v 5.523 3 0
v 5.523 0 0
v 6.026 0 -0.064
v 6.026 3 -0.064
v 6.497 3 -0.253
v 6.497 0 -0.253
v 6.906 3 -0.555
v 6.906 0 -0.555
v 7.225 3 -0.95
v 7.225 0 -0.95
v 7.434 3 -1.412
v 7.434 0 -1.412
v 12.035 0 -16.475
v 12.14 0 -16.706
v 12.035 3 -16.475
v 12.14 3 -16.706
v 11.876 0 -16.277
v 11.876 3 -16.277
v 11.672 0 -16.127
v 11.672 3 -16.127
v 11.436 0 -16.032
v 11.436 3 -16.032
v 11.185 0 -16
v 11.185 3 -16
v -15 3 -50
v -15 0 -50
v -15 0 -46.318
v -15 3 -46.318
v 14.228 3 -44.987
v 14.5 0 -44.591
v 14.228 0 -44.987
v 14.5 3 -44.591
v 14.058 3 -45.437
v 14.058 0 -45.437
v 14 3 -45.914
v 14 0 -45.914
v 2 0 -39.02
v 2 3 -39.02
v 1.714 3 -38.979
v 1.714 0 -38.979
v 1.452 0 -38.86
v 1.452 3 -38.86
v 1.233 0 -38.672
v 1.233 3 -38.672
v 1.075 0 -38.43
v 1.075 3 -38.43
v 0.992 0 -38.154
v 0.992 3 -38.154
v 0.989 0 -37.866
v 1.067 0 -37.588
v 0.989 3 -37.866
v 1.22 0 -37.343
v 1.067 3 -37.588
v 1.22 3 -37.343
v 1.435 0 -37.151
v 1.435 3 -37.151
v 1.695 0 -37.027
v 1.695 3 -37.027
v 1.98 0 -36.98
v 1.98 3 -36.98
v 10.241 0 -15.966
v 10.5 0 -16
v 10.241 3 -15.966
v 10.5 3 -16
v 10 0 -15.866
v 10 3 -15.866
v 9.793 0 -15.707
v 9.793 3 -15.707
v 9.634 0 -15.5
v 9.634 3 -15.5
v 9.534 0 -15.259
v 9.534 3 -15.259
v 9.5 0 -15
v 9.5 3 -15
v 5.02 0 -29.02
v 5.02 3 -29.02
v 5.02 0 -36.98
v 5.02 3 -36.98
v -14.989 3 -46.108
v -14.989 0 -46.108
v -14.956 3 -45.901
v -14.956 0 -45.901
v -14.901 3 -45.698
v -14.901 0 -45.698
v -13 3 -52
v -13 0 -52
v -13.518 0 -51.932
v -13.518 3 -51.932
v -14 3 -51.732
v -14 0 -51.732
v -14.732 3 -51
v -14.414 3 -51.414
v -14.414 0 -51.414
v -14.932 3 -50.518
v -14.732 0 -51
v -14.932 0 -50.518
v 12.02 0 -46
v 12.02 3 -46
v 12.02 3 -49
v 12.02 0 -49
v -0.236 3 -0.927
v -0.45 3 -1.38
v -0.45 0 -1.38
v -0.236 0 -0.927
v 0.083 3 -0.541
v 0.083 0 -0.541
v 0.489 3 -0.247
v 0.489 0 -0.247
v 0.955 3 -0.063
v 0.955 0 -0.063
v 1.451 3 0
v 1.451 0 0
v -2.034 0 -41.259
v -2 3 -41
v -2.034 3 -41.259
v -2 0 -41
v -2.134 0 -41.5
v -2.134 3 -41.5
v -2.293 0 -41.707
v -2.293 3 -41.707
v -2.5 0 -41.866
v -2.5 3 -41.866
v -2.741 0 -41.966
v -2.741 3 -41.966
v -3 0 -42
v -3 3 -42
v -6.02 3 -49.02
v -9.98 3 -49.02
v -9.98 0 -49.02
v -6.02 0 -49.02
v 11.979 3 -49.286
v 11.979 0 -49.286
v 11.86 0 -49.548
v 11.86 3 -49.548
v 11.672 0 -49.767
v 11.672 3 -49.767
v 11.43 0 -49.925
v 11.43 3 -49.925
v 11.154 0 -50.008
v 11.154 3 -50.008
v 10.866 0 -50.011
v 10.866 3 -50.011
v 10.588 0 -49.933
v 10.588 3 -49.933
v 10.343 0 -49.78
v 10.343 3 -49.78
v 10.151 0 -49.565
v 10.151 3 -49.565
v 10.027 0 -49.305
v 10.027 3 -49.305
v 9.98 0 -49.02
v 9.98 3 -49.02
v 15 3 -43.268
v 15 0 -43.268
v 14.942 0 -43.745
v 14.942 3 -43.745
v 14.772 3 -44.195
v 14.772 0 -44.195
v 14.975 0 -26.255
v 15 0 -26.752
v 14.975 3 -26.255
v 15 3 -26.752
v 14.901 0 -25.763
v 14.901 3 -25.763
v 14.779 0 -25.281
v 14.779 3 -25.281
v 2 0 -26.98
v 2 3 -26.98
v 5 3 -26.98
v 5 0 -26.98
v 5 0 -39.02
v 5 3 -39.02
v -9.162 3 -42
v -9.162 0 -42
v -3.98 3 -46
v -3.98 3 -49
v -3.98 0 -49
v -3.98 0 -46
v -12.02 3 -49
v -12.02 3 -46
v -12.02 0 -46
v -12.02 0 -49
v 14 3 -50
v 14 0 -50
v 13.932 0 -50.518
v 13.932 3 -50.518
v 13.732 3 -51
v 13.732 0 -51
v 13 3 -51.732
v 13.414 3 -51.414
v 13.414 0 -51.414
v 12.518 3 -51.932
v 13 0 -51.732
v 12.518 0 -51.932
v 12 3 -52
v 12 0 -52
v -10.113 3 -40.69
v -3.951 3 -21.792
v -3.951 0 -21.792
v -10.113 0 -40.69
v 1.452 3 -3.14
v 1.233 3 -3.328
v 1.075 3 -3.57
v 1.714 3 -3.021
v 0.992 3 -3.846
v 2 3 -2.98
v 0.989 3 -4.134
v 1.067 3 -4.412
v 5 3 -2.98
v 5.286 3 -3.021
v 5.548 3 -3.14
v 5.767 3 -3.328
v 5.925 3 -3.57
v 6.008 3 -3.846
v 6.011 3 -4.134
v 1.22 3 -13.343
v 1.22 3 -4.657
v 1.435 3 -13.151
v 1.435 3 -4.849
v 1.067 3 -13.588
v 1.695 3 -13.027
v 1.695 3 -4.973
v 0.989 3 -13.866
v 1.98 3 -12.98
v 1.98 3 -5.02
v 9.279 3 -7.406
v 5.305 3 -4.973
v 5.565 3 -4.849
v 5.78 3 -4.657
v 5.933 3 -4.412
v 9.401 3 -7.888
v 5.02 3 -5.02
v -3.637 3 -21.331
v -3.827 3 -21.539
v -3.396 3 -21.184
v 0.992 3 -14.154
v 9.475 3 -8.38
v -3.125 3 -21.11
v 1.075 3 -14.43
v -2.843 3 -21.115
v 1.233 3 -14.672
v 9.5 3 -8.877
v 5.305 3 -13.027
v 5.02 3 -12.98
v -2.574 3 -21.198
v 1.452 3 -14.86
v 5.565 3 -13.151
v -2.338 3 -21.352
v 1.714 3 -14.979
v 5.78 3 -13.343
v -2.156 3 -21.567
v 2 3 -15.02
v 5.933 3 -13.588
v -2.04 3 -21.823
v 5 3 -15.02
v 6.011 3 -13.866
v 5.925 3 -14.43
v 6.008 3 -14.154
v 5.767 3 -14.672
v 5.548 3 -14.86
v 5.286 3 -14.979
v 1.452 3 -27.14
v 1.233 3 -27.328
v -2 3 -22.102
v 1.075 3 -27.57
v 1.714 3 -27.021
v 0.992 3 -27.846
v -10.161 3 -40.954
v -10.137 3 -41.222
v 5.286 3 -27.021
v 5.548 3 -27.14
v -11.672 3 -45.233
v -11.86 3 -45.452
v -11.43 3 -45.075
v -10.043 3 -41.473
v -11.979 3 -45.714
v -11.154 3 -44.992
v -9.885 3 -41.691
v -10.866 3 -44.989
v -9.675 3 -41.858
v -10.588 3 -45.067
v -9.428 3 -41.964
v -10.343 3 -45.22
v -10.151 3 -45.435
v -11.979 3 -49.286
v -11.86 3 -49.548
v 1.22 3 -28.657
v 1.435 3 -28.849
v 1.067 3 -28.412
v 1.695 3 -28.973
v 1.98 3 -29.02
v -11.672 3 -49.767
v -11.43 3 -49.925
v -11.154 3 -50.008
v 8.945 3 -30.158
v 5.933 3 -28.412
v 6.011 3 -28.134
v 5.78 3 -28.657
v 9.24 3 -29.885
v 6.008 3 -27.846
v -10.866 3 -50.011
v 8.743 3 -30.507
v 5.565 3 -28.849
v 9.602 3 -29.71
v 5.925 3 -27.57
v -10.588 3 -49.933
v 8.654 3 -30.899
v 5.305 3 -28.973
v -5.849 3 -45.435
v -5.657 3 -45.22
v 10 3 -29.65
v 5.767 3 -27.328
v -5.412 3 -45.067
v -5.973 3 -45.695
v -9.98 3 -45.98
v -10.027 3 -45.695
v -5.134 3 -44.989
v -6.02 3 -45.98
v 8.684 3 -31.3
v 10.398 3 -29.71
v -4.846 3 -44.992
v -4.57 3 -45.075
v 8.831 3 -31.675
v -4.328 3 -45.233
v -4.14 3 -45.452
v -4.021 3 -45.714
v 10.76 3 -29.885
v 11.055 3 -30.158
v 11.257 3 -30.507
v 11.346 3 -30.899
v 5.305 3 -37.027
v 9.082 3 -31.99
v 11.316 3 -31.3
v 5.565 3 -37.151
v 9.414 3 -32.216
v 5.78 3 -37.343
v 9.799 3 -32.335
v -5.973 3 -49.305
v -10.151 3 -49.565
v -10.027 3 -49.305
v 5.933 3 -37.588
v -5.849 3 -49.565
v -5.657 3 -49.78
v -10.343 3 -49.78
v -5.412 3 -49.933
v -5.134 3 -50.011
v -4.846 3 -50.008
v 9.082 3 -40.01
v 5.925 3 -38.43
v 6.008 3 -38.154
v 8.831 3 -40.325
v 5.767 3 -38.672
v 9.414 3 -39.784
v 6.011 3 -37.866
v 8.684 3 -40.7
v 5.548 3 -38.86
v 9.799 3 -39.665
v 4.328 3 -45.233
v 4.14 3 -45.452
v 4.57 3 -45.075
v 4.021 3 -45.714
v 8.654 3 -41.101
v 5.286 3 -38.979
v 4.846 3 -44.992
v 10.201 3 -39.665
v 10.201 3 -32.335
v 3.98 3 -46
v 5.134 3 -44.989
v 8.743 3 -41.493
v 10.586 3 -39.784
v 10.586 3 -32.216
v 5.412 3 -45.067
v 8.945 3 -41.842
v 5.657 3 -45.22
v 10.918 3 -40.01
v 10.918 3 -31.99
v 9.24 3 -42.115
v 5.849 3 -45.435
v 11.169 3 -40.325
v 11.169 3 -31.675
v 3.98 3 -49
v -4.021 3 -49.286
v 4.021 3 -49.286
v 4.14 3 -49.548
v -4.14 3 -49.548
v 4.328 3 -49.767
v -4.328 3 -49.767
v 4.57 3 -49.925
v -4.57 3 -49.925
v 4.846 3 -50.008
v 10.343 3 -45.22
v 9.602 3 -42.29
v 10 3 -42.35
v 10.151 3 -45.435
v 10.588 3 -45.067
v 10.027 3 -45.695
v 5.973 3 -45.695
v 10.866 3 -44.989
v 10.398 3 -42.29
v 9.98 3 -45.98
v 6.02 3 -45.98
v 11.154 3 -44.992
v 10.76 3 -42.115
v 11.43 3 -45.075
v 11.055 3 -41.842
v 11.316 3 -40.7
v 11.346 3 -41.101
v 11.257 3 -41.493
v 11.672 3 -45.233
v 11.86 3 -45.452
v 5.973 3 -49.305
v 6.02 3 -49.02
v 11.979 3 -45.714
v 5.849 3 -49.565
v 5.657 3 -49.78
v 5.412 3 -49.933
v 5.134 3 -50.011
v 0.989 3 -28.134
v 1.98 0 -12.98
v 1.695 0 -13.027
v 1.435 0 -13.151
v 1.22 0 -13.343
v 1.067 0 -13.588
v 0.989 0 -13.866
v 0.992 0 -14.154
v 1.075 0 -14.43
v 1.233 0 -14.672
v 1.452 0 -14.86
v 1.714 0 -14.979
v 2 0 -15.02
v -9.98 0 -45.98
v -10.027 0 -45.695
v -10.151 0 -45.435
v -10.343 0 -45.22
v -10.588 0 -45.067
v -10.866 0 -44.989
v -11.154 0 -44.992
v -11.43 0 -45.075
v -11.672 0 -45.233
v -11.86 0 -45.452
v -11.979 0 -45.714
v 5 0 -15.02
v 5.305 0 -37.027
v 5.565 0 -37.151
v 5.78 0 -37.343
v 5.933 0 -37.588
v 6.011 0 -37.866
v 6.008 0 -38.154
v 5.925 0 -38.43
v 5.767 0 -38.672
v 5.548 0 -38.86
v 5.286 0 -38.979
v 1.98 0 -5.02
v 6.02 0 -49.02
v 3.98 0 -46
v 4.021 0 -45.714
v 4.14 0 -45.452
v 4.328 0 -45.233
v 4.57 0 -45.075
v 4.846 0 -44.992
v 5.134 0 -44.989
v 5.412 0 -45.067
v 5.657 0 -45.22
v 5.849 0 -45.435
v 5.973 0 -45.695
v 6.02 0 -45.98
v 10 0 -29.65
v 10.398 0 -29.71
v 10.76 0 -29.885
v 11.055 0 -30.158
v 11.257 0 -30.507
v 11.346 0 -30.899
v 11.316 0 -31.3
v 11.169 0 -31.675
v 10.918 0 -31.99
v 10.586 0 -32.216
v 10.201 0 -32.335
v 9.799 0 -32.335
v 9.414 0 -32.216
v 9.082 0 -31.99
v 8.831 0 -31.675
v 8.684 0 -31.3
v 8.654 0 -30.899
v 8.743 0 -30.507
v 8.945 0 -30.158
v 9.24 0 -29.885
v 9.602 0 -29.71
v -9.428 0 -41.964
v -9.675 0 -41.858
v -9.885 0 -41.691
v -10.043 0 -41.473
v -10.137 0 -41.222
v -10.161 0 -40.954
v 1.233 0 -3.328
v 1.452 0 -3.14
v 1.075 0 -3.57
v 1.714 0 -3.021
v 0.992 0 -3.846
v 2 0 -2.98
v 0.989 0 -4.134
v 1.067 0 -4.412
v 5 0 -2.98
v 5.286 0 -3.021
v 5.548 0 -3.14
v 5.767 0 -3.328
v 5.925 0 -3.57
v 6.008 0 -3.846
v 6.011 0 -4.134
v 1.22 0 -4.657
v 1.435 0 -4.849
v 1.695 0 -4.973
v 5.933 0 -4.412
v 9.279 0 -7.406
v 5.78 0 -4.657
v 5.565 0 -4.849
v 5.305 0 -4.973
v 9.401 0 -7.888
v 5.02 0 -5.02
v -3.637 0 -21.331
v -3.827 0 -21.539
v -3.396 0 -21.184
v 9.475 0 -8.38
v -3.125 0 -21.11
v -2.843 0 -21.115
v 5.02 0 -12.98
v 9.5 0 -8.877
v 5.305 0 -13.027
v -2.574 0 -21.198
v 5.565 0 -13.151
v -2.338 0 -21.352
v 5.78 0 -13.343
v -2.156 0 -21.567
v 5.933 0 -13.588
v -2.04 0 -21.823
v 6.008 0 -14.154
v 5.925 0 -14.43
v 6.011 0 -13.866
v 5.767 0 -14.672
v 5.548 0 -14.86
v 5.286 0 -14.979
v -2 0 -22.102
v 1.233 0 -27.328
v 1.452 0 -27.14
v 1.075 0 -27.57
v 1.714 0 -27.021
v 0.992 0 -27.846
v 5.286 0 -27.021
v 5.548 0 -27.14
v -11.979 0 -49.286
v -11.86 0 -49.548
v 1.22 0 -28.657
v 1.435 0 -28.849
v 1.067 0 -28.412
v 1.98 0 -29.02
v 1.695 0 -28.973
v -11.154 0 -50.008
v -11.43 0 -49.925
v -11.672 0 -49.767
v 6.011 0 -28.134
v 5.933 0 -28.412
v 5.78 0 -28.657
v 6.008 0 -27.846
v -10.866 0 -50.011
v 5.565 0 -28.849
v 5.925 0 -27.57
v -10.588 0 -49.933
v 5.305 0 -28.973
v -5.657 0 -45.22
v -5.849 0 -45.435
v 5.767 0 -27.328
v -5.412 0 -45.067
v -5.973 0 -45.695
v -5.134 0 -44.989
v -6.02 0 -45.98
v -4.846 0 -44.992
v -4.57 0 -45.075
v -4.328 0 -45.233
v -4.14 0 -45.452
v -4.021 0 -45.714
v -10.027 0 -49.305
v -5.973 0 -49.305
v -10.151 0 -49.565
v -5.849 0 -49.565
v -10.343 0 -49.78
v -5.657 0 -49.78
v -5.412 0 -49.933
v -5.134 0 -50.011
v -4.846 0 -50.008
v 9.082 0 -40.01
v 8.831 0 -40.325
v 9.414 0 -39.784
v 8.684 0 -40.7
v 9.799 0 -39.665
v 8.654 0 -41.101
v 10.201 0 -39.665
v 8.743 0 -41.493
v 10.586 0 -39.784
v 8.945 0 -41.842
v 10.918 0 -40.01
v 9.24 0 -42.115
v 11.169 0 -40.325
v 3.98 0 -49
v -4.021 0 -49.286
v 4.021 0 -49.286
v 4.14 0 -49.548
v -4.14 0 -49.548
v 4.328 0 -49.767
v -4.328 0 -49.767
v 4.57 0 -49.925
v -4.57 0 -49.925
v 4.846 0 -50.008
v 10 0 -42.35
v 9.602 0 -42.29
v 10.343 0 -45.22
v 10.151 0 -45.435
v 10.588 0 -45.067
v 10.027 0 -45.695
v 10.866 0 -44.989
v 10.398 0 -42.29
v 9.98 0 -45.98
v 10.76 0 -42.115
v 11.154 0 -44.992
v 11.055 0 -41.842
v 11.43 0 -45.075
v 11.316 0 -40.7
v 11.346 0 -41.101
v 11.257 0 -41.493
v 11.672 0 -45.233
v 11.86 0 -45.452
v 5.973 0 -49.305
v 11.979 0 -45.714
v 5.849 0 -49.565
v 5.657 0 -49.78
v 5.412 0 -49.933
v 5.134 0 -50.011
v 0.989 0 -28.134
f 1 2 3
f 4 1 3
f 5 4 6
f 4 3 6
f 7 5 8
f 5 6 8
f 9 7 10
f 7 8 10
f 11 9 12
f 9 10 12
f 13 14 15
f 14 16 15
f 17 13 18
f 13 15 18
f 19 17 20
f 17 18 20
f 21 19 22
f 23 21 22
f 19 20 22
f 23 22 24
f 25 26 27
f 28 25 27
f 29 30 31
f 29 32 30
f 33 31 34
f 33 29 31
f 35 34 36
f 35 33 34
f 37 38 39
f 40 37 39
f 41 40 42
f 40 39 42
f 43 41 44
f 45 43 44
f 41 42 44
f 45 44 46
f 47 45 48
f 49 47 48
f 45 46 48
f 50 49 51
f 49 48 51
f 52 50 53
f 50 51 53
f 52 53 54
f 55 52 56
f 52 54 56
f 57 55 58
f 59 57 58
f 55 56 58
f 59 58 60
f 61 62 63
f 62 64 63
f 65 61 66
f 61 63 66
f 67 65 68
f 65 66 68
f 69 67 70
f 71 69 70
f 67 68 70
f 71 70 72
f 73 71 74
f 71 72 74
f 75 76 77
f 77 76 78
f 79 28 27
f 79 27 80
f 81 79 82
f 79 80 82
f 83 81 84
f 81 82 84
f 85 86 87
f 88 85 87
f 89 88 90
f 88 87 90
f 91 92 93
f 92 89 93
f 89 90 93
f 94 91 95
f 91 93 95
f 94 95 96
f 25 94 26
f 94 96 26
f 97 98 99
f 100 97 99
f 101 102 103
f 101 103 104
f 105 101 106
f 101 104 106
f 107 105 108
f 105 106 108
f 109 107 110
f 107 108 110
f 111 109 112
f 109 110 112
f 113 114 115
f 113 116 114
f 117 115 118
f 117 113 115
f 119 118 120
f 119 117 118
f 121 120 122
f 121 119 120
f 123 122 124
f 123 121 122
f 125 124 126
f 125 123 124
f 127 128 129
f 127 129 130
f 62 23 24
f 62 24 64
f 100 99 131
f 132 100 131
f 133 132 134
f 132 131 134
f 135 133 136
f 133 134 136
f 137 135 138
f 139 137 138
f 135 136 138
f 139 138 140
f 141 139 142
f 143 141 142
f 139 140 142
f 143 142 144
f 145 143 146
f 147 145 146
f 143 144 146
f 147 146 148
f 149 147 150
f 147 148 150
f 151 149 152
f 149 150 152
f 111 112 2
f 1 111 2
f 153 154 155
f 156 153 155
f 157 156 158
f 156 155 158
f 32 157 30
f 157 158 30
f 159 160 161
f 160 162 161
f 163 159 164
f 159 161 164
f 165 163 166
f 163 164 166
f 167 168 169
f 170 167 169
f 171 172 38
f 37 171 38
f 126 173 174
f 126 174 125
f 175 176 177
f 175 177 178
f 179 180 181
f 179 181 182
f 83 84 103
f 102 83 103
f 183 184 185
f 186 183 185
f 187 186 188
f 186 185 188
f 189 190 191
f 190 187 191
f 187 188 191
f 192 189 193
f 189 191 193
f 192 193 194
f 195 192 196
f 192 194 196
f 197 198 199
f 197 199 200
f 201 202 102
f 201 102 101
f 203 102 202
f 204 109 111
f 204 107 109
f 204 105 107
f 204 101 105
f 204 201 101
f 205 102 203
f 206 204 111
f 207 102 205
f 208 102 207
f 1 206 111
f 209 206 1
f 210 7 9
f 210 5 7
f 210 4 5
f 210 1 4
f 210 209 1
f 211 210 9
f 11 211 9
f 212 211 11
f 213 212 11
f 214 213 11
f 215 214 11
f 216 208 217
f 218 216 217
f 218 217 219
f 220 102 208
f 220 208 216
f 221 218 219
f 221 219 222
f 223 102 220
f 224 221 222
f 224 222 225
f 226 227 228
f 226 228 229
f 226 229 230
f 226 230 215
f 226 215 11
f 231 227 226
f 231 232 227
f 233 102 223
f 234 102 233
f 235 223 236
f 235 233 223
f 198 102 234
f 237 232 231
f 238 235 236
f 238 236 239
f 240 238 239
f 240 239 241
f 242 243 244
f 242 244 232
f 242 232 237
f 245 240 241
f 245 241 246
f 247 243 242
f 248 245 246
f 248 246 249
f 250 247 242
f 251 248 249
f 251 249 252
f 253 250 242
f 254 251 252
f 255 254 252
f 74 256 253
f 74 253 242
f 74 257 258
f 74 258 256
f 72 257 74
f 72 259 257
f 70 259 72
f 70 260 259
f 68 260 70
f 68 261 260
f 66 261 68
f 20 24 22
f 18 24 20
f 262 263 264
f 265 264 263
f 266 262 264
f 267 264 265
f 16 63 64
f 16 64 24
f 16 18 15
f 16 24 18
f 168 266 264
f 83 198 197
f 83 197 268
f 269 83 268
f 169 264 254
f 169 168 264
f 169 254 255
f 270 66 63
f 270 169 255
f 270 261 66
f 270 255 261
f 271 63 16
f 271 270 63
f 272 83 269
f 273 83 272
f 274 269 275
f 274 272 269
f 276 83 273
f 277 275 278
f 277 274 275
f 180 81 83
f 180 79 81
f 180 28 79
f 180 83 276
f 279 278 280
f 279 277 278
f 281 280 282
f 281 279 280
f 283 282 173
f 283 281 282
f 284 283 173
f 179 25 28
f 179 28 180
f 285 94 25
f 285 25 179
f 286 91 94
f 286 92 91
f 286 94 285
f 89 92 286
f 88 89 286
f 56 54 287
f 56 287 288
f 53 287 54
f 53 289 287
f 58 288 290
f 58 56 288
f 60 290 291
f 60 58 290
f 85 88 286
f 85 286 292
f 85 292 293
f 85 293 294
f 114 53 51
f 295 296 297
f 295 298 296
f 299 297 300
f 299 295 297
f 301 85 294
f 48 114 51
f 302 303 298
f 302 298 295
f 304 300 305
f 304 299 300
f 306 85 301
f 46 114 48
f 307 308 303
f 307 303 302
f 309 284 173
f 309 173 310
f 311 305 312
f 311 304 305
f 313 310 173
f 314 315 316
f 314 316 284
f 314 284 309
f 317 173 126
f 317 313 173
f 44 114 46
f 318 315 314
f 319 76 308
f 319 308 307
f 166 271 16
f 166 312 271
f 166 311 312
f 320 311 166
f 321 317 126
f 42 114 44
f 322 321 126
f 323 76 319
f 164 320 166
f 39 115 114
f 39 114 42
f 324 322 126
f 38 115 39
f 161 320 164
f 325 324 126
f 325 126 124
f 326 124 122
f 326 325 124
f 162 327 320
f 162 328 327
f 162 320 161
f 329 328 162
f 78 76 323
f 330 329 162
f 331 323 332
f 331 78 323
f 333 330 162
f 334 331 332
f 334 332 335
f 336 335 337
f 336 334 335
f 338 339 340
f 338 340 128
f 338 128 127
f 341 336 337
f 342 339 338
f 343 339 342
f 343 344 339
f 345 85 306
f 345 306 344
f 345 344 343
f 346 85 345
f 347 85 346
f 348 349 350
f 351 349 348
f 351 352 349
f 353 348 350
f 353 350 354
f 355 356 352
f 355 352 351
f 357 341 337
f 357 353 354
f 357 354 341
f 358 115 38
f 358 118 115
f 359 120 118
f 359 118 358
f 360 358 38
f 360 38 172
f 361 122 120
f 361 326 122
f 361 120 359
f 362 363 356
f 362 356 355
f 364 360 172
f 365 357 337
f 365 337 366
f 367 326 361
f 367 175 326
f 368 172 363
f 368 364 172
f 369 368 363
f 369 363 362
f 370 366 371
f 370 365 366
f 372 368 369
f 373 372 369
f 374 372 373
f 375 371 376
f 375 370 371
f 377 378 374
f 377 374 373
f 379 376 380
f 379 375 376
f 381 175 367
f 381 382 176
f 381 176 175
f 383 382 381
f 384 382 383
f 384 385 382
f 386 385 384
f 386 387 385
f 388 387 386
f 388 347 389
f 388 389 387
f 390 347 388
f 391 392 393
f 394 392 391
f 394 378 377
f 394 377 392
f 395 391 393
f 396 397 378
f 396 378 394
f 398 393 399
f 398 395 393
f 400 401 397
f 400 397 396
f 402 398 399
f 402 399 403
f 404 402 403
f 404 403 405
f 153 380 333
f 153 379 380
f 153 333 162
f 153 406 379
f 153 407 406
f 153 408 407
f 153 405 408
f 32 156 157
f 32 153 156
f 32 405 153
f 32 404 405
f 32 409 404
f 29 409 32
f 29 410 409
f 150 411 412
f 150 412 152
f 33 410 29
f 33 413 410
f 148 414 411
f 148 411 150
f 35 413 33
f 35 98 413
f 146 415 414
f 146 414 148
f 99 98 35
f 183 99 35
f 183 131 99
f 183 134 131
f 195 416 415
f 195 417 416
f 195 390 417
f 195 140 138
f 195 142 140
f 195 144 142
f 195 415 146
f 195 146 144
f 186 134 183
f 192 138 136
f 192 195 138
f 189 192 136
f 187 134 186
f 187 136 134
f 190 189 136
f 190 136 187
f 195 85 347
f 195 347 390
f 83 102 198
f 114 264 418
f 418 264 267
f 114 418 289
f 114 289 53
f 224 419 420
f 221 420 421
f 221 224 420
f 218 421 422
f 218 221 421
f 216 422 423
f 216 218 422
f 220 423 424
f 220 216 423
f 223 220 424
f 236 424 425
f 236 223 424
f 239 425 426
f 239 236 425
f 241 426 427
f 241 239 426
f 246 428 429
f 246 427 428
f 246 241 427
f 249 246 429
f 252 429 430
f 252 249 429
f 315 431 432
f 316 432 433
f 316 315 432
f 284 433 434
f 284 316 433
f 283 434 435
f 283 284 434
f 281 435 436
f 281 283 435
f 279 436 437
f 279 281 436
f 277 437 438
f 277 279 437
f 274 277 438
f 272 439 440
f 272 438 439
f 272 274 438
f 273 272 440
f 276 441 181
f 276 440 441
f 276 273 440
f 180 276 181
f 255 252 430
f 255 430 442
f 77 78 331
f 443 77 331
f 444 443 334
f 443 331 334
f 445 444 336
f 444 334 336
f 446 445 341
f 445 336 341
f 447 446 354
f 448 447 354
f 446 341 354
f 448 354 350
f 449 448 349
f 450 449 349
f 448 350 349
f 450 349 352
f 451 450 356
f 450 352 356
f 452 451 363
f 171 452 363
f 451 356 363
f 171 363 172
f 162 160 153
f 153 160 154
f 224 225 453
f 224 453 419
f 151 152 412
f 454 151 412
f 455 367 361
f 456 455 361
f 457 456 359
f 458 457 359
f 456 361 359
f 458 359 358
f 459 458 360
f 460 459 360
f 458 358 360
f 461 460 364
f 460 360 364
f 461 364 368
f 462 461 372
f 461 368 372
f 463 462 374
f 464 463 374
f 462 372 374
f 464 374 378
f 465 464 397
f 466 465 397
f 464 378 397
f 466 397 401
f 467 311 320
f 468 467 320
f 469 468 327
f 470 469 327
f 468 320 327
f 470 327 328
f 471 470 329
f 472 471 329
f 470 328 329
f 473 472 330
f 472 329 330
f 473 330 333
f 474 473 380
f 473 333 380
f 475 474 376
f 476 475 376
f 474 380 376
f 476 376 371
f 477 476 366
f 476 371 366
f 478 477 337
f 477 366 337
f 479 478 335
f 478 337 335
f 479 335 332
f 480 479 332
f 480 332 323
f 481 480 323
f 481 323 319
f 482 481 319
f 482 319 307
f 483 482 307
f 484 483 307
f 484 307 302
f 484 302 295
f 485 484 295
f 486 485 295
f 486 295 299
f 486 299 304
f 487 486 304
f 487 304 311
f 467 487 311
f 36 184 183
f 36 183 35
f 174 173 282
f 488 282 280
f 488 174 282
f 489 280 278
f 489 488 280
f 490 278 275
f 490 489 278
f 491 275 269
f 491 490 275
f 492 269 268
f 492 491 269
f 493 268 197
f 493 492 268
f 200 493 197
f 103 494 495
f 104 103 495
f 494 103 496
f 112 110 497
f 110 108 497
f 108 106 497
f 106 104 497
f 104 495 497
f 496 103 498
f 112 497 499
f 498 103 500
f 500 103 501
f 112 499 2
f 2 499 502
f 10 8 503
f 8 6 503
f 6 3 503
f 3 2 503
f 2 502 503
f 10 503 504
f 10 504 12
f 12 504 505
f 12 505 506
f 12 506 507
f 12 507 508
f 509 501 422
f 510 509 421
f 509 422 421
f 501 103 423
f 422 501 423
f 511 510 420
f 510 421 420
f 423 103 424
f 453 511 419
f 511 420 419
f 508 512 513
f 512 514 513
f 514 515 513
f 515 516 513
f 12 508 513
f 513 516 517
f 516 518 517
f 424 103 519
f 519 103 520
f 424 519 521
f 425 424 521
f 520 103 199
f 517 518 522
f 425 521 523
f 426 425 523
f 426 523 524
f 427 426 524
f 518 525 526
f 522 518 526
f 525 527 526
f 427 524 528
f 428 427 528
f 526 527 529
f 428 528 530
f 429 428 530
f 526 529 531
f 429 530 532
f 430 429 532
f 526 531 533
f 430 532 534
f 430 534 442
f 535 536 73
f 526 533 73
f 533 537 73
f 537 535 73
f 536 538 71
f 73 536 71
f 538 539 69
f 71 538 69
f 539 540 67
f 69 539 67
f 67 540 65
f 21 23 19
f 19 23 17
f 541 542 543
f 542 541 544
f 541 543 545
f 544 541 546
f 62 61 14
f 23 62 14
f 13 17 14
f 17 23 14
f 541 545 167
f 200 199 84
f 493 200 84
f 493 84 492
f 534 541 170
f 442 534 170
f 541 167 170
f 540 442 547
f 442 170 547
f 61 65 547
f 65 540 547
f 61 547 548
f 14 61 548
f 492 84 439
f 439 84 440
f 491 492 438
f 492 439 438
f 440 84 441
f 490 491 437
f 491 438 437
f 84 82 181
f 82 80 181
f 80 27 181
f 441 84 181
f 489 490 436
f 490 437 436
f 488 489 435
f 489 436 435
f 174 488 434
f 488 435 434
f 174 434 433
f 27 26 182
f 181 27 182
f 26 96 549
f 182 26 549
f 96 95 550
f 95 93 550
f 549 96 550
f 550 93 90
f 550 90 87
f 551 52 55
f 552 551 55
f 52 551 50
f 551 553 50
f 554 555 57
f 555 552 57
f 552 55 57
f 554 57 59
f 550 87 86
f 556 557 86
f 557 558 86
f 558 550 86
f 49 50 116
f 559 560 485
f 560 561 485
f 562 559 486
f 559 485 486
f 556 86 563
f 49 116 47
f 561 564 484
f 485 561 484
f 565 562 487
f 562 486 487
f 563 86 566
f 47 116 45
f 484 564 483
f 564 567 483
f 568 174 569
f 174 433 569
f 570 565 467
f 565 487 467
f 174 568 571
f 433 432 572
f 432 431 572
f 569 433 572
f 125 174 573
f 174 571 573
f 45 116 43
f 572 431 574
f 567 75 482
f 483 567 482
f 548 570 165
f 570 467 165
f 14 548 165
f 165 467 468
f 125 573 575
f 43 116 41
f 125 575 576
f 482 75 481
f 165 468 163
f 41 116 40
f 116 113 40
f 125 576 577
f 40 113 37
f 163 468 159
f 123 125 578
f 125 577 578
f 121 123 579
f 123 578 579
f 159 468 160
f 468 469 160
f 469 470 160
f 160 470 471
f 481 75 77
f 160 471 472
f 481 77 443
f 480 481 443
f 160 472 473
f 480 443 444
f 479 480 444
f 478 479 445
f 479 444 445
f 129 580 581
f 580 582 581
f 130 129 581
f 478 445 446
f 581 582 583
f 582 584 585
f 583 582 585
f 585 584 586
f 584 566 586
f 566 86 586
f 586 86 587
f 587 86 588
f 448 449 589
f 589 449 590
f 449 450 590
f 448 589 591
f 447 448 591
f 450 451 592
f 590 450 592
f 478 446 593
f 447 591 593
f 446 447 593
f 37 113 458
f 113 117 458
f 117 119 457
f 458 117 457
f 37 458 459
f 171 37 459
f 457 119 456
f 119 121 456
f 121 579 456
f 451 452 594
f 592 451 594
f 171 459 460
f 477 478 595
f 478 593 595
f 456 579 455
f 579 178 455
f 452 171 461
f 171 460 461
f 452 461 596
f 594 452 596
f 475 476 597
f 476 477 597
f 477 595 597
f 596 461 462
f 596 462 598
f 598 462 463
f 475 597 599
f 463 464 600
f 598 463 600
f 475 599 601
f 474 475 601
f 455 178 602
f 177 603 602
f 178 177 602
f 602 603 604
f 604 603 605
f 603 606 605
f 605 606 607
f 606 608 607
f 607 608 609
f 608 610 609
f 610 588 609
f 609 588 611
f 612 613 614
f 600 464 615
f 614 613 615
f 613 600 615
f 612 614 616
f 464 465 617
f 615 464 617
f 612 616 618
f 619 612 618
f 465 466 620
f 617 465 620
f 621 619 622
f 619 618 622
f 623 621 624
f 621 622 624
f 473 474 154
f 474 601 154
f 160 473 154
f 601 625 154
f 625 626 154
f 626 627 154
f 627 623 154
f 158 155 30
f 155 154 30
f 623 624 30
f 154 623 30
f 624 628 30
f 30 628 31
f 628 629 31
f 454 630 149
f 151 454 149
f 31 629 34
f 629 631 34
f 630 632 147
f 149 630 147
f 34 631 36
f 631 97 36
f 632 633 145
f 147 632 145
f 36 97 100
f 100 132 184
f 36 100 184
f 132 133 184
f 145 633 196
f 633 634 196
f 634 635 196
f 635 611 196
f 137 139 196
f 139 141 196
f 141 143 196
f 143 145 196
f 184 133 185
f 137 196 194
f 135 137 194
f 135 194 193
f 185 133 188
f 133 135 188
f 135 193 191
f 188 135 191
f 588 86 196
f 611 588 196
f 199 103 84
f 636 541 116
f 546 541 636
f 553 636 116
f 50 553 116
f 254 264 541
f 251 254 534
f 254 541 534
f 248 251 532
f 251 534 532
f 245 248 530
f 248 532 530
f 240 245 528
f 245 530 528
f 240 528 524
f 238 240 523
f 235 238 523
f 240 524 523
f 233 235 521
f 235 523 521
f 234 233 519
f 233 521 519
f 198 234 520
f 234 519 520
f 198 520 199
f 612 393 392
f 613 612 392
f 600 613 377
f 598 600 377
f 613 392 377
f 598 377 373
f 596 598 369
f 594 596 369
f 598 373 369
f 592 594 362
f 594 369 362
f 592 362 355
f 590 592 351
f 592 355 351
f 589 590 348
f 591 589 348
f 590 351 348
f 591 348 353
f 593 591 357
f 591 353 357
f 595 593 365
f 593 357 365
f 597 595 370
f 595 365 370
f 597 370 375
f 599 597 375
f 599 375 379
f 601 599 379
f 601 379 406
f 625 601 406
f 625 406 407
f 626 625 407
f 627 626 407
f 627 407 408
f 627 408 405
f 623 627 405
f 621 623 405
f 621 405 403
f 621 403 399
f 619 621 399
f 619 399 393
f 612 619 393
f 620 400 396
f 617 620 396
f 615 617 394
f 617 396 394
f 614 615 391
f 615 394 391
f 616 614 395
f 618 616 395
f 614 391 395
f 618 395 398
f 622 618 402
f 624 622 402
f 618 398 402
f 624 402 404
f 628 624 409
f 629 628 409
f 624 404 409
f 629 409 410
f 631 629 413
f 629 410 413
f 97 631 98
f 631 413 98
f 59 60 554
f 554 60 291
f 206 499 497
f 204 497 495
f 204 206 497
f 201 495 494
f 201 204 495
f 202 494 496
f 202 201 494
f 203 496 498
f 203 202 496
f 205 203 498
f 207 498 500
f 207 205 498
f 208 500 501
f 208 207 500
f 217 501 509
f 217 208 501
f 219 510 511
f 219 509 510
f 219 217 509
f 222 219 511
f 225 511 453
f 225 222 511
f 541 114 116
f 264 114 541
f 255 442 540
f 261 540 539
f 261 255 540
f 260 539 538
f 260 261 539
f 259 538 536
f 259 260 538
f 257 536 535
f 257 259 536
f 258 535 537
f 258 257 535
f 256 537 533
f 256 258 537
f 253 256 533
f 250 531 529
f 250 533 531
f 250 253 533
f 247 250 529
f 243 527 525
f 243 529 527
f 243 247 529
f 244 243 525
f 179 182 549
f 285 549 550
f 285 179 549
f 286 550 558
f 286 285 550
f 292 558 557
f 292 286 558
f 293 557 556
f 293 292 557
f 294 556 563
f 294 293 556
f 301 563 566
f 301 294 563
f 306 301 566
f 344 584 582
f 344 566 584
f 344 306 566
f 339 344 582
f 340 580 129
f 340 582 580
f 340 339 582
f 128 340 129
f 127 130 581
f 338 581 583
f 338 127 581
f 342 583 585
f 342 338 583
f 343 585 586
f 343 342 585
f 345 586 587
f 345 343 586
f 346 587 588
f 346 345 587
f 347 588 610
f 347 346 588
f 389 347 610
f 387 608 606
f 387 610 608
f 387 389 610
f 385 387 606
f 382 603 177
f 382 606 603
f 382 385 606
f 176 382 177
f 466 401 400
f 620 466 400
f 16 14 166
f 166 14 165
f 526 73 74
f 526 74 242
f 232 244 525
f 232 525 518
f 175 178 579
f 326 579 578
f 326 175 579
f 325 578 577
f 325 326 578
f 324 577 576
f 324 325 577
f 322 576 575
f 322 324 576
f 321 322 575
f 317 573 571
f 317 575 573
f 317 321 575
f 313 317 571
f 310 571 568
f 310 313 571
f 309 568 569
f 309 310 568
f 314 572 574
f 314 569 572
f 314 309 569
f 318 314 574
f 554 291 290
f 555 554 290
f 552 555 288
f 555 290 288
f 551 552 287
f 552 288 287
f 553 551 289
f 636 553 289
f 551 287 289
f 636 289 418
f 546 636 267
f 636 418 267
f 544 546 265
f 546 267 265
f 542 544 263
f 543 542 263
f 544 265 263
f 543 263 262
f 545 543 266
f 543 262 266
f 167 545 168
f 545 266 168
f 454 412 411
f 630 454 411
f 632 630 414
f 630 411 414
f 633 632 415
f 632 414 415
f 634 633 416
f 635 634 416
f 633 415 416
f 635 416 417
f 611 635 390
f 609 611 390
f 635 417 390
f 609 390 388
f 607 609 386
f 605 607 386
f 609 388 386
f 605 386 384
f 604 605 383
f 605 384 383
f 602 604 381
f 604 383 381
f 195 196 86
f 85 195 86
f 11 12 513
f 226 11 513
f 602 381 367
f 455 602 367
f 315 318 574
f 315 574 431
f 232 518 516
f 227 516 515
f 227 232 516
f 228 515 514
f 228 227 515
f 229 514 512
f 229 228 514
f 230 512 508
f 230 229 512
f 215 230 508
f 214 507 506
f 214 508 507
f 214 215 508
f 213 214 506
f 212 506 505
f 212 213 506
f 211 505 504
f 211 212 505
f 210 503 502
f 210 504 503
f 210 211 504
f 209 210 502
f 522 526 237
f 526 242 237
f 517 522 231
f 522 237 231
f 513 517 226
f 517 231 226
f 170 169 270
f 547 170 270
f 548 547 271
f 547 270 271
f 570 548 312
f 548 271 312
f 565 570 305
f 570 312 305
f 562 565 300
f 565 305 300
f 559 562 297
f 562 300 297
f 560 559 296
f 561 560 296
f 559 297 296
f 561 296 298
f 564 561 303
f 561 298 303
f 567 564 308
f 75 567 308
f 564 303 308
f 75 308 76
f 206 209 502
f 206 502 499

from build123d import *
from OCP.BRepFilletAPI import BRepFilletAPI_MakeFillet

# Parameters (mm, degrees)
SKETCH_1_W             = 3
SKETCH_1_H             = 12
SKETCH_1_W_2           = 8
SKETCH_1_H_2           = 3
EXTRUDE_1_DEPTH        = 3
SKETCH_3_R             = 1
CUT_EXTRUDE_1_DEPTH    = 55.203320931
SKETCH_4_W             = 1
SKETCH_4_H             = 7
CUT_EXTRUDE_2_DEPTH    = 55.203320931
SKETCH_6_R             = 1.35
CUT_EXTRUDE_3_DEPTH    = 55.203320931
CUT_EXTRUDE_4_DEPTH    = 55.203320931
CUT_EXTRUDE_6_DEPTH    = 55.203320931
FILLET_1_R             = 2
FILLET_2_R1            = 5
FILLET_2_R2            = 1
FILLET_2_R3            = 2
CUT_EXTRUDE_5602_DEPTH = 55.203320931
FILLET_3_R1            = 1
FILLET_3_R2            = 5


with BuildPart() as part:
    # 草图1 → 凸台-拉伸1 (new body)
    with BuildSketch(Plane(origin=(0, 0, 0), x_dir=(1, 0, 0), z_dir=(0, 1, 0))):
        Polygon((15, 26), (15, 52), (0, 52), (-15, 52), (-15, 46), (0, 0), (7, 0), align=None)
        with Locations((3.5, 9)):
            Rectangle(SKETCH_1_W, SKETCH_1_H, mode=Mode.SUBTRACT)
        with Locations((3.5, 33)):
            Rectangle(SKETCH_1_W, SKETCH_1_H, mode=Mode.SUBTRACT)
        with Locations((-8, 47.5)):
            Rectangle(SKETCH_1_W_2, SKETCH_1_H_2, mode=Mode.SUBTRACT)
        with Locations((8, 47.5)):
            Rectangle(SKETCH_1_W_2, SKETCH_1_H_2, mode=Mode.SUBTRACT)
    extrude(amount=EXTRUDE_1_DEPTH)

    # 草图3 → 切除-拉伸1 (cut, through all)
    with BuildSketch(Plane(origin=(0, 3, 0), x_dir=(1, 0, 0), z_dir=(0, 1, 0))):
        with Locations((5, 4)):
            Circle(SKETCH_3_R)
        with Locations((5, 14)):
            Circle(SKETCH_3_R)
        with Locations((2, 4)):
            Circle(SKETCH_3_R)
        with Locations((2, 14)):
            Circle(SKETCH_3_R)
        with Locations((2, 28)):
            Circle(SKETCH_3_R)
        with Locations((2, 38)):
            Circle(SKETCH_3_R)
        with Locations((5, 28)):
            Circle(SKETCH_3_R)
        with Locations((5, 38)):
            Circle(SKETCH_3_R)
        with Locations((-5, 49)):
            Circle(SKETCH_3_R)
        with Locations((-11, 49)):
            Circle(SKETCH_3_R)
        with Locations((-11, 46)):
            Circle(SKETCH_3_R)
        with Locations((-5, 46)):
            Circle(SKETCH_3_R)
        with Locations((5, 46)):
            Circle(SKETCH_3_R)
        with Locations((11, 46)):
            Circle(SKETCH_3_R)
        with Locations((11, 49)):
            Circle(SKETCH_3_R)
        with Locations((5, 49)):
            Circle(SKETCH_3_R)
    extrude(amount=-CUT_EXTRUDE_1_DEPTH, mode=Mode.SUBTRACT)

    # 草图4 → 切除-拉伸2 (cut, through all)
    with BuildSketch(Plane.XZ):
        with Locations((14.5, -48.5)):
            Rectangle(SKETCH_4_W, SKETCH_4_H)
    extrude(amount=-CUT_EXTRUDE_2_DEPTH, mode=Mode.SUBTRACT)

    # 草图6 → 切除-拉伸3 (cut, through all)
    with BuildSketch(Plane(origin=(0, 3, 0), x_dir=(1, 0, 0), z_dir=(0, 1, 0))):
        with Locations(Location((10, 31, 0), (0, 0, 270))):
            Circle(SKETCH_6_R)
        with Locations(Location((10, 41, 0), (0, 0, 90))):
            Circle(SKETCH_6_R)
    extrude(amount=-CUT_EXTRUDE_3_DEPTH, mode=Mode.SUBTRACT)

    # 草图7 → 切除-拉伸4 (cut, through all)
    with BuildSketch(Plane(origin=(0, 3, 0), x_dir=(1, 0, 0), z_dir=(0, 1, 0))):
        Polygon((-2, 15.810109656), (-10.540181634, 42), (-2, 42), align=None)
    extrude(amount=-CUT_EXTRUDE_4_DEPTH, mode=Mode.SUBTRACT)

    # 草图9 → 切除-拉伸6 (cut, through all)
    with BuildSketch(Plane.XZ):
        Polygon((11.923076923, -16), (9.5, -16), (9.5, -8.125), align=None)
    extrude(amount=-CUT_EXTRUDE_6_DEPTH, mode=Mode.SUBTRACT)

    # 圆角1
    # the kernel refuses this fillet: 2 mm, written as the material it takes off along each edge
    with BuildSketch(Plane(origin=(15, -4.330127019, -45), x_dir=(0, 0, 1), z_dir=(0, 1, 0))) as fillet_1_piece_1:
        with BuildLine():
            CenterArc((1.732050808, -2), FILLET_1_R, 90, 60)
            Line((0, -1), (-0.034641016, -0.98))
            ThreePointArc((-0.034641016, -0.98), (-0.04, -0.5), (-0.04, 0))
            Line((-0.04, 0), (0, 0.04))
            Line((0, 0.04), (1.732050808, 0.04))
            Line((1.732050808, 0.04), (1.732050808, 0))
        make_face()
    extrude(amount=11.660254038, mode=Mode.SUBTRACT)
    with BuildSketch(Plane(origin=(7, -3.692873273, 0), x_dir=(-1, 0, 0), z_dir=(0, 1, 0))) as fillet_1_piece_2:
        with BuildLine():
            CenterArc((FILLET_1_R * 0.738574654518, -FILLET_1_R), FILLET_1_R, 90, 72.897271031)
            Line((-FILLET_1_R * 0.217204354204, -FILLET_1_R * 0.705914151162), (-FILLET_1_R * 0.236319934378, -FILLET_1_R * 0.700032434186))
            Line((-FILLET_1_R * 0.236319934378, -FILLET_1_R * 0.700032434186), (-FILLET_1_R * 0.0147714930904, FILLET_1_R * 0.02))
            Line((-FILLET_1_R * 0.0147714930904, FILLET_1_R * 0.02), (FILLET_1_R * 0.738574654518, FILLET_1_R * 0.02))
            Line((FILLET_1_R * 0.738574654518, FILLET_1_R * 0.02), (FILLET_1_R * 0.738574654518, 0))
        make_face()
    extrude(amount=10.385746545, mode=Mode.SUBTRACT)
    with BuildSketch(Plane(origin=(0, -3.628682784, 0), x_dir=(1, 0, 0), z_dir=(0, 1, 0))) as fillet_1_piece_3:
        with BuildLine():
            CenterArc((FILLET_1_R * 0.725736556818, FILLET_1_R), FILLET_1_R, 198.060471936, 71.939528064)
            Line((-FILLET_1_R * 0.224993282664, FILLET_1_R * 0.689979400169), (-FILLET_1_R * 0.244007879453, FILLET_1_R * 0.683778988172))
            Line((-FILLET_1_R * 0.244007879453, FILLET_1_R * 0.683778988172), (-FILLET_1_R * 0.0145147311364, -FILLET_1_R * 0.02))
            Line((-FILLET_1_R * 0.0145147311364, -FILLET_1_R * 0.02), (FILLET_1_R * 0.725736556818, -FILLET_1_R * 0.02))
            Line((FILLET_1_R * 0.725736556818, -FILLET_1_R * 0.02), (FILLET_1_R * 0.725736556818, 0))
        make_face()
    extrude(amount=10.257365568, mode=Mode.SUBTRACT)
    with BuildSketch(Plane(origin=(-15, -0.794627205, -46), x_dir=(0.31002059983091895, 0, 0.9507298394814782), z_dir=(0, 1, 0))) as fillet_1_piece_4:
        with BuildLine():
            CenterArc((FILLET_1_R * 0.158925440907, FILLET_1_R), FILLET_1_R, 251.939528064, 18.060471936)
            Line((-FILLET_1_R * 0.151095158923, FILLET_1_R * 0.0492701605185), (-FILLET_1_R * 0.15729557092, FILLET_1_R * 0.0302555637289))
            Line((-FILLET_1_R * 0.15729557092, FILLET_1_R * 0.0302555637289), (-FILLET_1_R * 0.00317850881815, -FILLET_1_R * 0.02))
            Line((-FILLET_1_R * 0.00317850881815, -FILLET_1_R * 0.02), (FILLET_1_R * 0.158925440907, -FILLET_1_R * 0.02))
            Line((FILLET_1_R * 0.158925440907, -FILLET_1_R * 0.02), (FILLET_1_R * 0.158925440907, 0))
        make_face()
    extrude(amount=4.589254409, mode=Mode.SUBTRACT)
    with BuildSketch(Plane(origin=(14, -5, -52), x_dir=(-1, 0, 0), z_dir=(0, 1, 0)), Plane(origin=(-15, -5, -52), x_dir=(0, 0, 1), z_dir=(0, 1, 0))) as fillet_1_piece_5:
        with BuildLine():
            CenterArc((FILLET_1_R, FILLET_1_R), FILLET_1_R, 180, 90)
            Line((0, FILLET_1_R), (-FILLET_1_R * 0.02, FILLET_1_R))
            Line((-FILLET_1_R * 0.02, FILLET_1_R), (-FILLET_1_R * 0.02, -FILLET_1_R * 0.02))
            Line((-FILLET_1_R * 0.02, -FILLET_1_R * 0.02), (FILLET_1_R, -FILLET_1_R * 0.02))
            Line((FILLET_1_R, -FILLET_1_R * 0.02), (FILLET_1_R, 0))
        make_face()
    extrude(amount=13, mode=Mode.SUBTRACT)

    # 圆角2: one fillet with a radius per group of edges: ONE call of the kernel's fillet builder (fillet() takes one radius for all edges)
    fillet_2_edges_1 = [part.edges().sort_by_distance(p)[0] for p in [
        (15, 1.5, -26),
    ]]
    fillet_2_edges_2 = [part.edges().sort_by_distance(p)[0] for p in [
        (-10.540181634, 1.5, -42),
        (-2, 1.5, -42),
        (-2, 1.5, -15.810109656),
    ]]
    fillet_2_edges_3 = [part.edges().sort_by_distance(p)[0] for p in [
        (14, 1.5, -45),
    ]]
    fillet_2 = BRepFilletAPI_MakeFillet(part.part.solid().wrapped)
    for e in fillet_2_edges_1:
        fillet_2.Add(FILLET_2_R1, e.wrapped)
    for e in fillet_2_edges_2:
        fillet_2.Add(FILLET_2_R2, e.wrapped)
    for e in fillet_2_edges_3:
        fillet_2.Add(FILLET_2_R3, e.wrapped)
    add(Compound.cast(fillet_2.Shape()), mode=Mode.REPLACE)

    # 草图8 → Cut-Extrude 5602 (cut, through all)
    with BuildSketch(Plane(origin=(0, 3, 0), x_dir=(1, 0, 0), z_dir=(0, 1, 0))):
        with BuildLine():
            Line((9.980196097, 49.02), (6.019803903, 49.02))
            ThreePointArc((6.019803903, 49.02), (4.989999519, 50.019950975), (3.98, 49))
            Line((3.98, 49), (3.98, 46))
            ThreePointArc((3.98, 46), (4.989999519, 44.980049025), (6.019803903, 45.98))
            Line((6.019803903, 45.98), (9.980196097, 45.98))
            ThreePointArc((9.980196097, 45.98), (11.010000481, 44.980049025), (12.02, 46))
            Line((12.02, 46), (12.02, 49))
            ThreePointArc((12.02, 49), (11.010000481, 50.019950975), (9.980196097, 49.02))
        make_face()
        with BuildLine():
            Line((-12.02, 46), (-12.02, 49))
            ThreePointArc((-12.02, 49), (-11.010000481, 50.019950975), (-9.980196097, 49.02))
            Line((-9.980196097, 49.02), (-6.019803903, 49.02))
            ThreePointArc((-6.019803903, 49.02), (-4.989999519, 50.019950975), (-3.98, 49))
            Line((-3.98, 49), (-3.98, 46))
            ThreePointArc((-3.98, 46), (-4.989999519, 44.980049025), (-6.019803903, 45.98))
            Line((-6.019803903, 45.98), (-9.980196097, 45.98))
            ThreePointArc((-9.980196097, 45.98), (-11.010000481, 44.980049025), (-12.02, 46))
        make_face()
        with BuildLine():
            Line((1.98, 36.980196097), (1.98, 29.019803903))
            ThreePointArc((1.98, 29.019803903), (0.980049025, 27.989999519), (2, 26.98))
            Line((2, 26.98), (5, 26.98))
            ThreePointArc((5, 26.98), (6.019950975, 27.989999519), (5.02, 29.019803903))
            Line((5.02, 29.019803903), (5.02, 36.980196097))
            ThreePointArc((5.02, 36.980196097), (6.019950975, 38.010000481), (5, 39.02))
            Line((5, 39.02), (2, 39.02))
            ThreePointArc((2, 39.02), (0.980049025, 38.010000481), (1.98, 36.980196097))
        make_face()
        with BuildLine():
            Line((5, 2.98), (2, 2.98))
            ThreePointArc((2, 2.98), (0.980049025, 3.989999519), (1.98, 5.019803903))
            Line((1.98, 5.019803903), (1.98, 12.980196097))
            ThreePointArc((1.98, 12.980196097), (0.980049025, 14.010000481), (2, 15.02))
            Line((2, 15.02), (5, 15.02))
            ThreePointArc((5, 15.02), (6.019950975, 14.010000481), (5.02, 12.980196097))
            Line((5.02, 12.980196097), (5.02, 5.019803903))
            ThreePointArc((5.02, 5.019803903), (6.019950975, 3.989999519), (5, 2.98))
        make_face()
    extrude(amount=-CUT_EXTRUDE_5602_DEPTH, mode=Mode.SUBTRACT)

    # 圆角3: one fillet with a radius per group of edges: ONE call of the kernel's fillet builder (fillet() takes one radius for all edges)
    fillet_3_edges_1 = [part.edges().sort_by_distance(p)[0] for p in [
        (9.5, 1.5, -16),
        (11.923076923, 1.5, -16),
    ]]
    fillet_3_edges_2 = [part.edges().sort_by_distance(p)[0] for p in [
        (9.5, 1.5, -8.125),
    ]]
    fillet_3 = BRepFilletAPI_MakeFillet(part.part.solid().wrapped)
    for e in fillet_3_edges_1:
        fillet_3.Add(FILLET_3_R1, e.wrapped)
    for e in fillet_3_edges_2:
        fillet_3.Add(FILLET_3_R2, e.wrapped)
    add(Compound.cast(fillet_3.Shape()), mode=Mode.REPLACE)


solid = part.part
